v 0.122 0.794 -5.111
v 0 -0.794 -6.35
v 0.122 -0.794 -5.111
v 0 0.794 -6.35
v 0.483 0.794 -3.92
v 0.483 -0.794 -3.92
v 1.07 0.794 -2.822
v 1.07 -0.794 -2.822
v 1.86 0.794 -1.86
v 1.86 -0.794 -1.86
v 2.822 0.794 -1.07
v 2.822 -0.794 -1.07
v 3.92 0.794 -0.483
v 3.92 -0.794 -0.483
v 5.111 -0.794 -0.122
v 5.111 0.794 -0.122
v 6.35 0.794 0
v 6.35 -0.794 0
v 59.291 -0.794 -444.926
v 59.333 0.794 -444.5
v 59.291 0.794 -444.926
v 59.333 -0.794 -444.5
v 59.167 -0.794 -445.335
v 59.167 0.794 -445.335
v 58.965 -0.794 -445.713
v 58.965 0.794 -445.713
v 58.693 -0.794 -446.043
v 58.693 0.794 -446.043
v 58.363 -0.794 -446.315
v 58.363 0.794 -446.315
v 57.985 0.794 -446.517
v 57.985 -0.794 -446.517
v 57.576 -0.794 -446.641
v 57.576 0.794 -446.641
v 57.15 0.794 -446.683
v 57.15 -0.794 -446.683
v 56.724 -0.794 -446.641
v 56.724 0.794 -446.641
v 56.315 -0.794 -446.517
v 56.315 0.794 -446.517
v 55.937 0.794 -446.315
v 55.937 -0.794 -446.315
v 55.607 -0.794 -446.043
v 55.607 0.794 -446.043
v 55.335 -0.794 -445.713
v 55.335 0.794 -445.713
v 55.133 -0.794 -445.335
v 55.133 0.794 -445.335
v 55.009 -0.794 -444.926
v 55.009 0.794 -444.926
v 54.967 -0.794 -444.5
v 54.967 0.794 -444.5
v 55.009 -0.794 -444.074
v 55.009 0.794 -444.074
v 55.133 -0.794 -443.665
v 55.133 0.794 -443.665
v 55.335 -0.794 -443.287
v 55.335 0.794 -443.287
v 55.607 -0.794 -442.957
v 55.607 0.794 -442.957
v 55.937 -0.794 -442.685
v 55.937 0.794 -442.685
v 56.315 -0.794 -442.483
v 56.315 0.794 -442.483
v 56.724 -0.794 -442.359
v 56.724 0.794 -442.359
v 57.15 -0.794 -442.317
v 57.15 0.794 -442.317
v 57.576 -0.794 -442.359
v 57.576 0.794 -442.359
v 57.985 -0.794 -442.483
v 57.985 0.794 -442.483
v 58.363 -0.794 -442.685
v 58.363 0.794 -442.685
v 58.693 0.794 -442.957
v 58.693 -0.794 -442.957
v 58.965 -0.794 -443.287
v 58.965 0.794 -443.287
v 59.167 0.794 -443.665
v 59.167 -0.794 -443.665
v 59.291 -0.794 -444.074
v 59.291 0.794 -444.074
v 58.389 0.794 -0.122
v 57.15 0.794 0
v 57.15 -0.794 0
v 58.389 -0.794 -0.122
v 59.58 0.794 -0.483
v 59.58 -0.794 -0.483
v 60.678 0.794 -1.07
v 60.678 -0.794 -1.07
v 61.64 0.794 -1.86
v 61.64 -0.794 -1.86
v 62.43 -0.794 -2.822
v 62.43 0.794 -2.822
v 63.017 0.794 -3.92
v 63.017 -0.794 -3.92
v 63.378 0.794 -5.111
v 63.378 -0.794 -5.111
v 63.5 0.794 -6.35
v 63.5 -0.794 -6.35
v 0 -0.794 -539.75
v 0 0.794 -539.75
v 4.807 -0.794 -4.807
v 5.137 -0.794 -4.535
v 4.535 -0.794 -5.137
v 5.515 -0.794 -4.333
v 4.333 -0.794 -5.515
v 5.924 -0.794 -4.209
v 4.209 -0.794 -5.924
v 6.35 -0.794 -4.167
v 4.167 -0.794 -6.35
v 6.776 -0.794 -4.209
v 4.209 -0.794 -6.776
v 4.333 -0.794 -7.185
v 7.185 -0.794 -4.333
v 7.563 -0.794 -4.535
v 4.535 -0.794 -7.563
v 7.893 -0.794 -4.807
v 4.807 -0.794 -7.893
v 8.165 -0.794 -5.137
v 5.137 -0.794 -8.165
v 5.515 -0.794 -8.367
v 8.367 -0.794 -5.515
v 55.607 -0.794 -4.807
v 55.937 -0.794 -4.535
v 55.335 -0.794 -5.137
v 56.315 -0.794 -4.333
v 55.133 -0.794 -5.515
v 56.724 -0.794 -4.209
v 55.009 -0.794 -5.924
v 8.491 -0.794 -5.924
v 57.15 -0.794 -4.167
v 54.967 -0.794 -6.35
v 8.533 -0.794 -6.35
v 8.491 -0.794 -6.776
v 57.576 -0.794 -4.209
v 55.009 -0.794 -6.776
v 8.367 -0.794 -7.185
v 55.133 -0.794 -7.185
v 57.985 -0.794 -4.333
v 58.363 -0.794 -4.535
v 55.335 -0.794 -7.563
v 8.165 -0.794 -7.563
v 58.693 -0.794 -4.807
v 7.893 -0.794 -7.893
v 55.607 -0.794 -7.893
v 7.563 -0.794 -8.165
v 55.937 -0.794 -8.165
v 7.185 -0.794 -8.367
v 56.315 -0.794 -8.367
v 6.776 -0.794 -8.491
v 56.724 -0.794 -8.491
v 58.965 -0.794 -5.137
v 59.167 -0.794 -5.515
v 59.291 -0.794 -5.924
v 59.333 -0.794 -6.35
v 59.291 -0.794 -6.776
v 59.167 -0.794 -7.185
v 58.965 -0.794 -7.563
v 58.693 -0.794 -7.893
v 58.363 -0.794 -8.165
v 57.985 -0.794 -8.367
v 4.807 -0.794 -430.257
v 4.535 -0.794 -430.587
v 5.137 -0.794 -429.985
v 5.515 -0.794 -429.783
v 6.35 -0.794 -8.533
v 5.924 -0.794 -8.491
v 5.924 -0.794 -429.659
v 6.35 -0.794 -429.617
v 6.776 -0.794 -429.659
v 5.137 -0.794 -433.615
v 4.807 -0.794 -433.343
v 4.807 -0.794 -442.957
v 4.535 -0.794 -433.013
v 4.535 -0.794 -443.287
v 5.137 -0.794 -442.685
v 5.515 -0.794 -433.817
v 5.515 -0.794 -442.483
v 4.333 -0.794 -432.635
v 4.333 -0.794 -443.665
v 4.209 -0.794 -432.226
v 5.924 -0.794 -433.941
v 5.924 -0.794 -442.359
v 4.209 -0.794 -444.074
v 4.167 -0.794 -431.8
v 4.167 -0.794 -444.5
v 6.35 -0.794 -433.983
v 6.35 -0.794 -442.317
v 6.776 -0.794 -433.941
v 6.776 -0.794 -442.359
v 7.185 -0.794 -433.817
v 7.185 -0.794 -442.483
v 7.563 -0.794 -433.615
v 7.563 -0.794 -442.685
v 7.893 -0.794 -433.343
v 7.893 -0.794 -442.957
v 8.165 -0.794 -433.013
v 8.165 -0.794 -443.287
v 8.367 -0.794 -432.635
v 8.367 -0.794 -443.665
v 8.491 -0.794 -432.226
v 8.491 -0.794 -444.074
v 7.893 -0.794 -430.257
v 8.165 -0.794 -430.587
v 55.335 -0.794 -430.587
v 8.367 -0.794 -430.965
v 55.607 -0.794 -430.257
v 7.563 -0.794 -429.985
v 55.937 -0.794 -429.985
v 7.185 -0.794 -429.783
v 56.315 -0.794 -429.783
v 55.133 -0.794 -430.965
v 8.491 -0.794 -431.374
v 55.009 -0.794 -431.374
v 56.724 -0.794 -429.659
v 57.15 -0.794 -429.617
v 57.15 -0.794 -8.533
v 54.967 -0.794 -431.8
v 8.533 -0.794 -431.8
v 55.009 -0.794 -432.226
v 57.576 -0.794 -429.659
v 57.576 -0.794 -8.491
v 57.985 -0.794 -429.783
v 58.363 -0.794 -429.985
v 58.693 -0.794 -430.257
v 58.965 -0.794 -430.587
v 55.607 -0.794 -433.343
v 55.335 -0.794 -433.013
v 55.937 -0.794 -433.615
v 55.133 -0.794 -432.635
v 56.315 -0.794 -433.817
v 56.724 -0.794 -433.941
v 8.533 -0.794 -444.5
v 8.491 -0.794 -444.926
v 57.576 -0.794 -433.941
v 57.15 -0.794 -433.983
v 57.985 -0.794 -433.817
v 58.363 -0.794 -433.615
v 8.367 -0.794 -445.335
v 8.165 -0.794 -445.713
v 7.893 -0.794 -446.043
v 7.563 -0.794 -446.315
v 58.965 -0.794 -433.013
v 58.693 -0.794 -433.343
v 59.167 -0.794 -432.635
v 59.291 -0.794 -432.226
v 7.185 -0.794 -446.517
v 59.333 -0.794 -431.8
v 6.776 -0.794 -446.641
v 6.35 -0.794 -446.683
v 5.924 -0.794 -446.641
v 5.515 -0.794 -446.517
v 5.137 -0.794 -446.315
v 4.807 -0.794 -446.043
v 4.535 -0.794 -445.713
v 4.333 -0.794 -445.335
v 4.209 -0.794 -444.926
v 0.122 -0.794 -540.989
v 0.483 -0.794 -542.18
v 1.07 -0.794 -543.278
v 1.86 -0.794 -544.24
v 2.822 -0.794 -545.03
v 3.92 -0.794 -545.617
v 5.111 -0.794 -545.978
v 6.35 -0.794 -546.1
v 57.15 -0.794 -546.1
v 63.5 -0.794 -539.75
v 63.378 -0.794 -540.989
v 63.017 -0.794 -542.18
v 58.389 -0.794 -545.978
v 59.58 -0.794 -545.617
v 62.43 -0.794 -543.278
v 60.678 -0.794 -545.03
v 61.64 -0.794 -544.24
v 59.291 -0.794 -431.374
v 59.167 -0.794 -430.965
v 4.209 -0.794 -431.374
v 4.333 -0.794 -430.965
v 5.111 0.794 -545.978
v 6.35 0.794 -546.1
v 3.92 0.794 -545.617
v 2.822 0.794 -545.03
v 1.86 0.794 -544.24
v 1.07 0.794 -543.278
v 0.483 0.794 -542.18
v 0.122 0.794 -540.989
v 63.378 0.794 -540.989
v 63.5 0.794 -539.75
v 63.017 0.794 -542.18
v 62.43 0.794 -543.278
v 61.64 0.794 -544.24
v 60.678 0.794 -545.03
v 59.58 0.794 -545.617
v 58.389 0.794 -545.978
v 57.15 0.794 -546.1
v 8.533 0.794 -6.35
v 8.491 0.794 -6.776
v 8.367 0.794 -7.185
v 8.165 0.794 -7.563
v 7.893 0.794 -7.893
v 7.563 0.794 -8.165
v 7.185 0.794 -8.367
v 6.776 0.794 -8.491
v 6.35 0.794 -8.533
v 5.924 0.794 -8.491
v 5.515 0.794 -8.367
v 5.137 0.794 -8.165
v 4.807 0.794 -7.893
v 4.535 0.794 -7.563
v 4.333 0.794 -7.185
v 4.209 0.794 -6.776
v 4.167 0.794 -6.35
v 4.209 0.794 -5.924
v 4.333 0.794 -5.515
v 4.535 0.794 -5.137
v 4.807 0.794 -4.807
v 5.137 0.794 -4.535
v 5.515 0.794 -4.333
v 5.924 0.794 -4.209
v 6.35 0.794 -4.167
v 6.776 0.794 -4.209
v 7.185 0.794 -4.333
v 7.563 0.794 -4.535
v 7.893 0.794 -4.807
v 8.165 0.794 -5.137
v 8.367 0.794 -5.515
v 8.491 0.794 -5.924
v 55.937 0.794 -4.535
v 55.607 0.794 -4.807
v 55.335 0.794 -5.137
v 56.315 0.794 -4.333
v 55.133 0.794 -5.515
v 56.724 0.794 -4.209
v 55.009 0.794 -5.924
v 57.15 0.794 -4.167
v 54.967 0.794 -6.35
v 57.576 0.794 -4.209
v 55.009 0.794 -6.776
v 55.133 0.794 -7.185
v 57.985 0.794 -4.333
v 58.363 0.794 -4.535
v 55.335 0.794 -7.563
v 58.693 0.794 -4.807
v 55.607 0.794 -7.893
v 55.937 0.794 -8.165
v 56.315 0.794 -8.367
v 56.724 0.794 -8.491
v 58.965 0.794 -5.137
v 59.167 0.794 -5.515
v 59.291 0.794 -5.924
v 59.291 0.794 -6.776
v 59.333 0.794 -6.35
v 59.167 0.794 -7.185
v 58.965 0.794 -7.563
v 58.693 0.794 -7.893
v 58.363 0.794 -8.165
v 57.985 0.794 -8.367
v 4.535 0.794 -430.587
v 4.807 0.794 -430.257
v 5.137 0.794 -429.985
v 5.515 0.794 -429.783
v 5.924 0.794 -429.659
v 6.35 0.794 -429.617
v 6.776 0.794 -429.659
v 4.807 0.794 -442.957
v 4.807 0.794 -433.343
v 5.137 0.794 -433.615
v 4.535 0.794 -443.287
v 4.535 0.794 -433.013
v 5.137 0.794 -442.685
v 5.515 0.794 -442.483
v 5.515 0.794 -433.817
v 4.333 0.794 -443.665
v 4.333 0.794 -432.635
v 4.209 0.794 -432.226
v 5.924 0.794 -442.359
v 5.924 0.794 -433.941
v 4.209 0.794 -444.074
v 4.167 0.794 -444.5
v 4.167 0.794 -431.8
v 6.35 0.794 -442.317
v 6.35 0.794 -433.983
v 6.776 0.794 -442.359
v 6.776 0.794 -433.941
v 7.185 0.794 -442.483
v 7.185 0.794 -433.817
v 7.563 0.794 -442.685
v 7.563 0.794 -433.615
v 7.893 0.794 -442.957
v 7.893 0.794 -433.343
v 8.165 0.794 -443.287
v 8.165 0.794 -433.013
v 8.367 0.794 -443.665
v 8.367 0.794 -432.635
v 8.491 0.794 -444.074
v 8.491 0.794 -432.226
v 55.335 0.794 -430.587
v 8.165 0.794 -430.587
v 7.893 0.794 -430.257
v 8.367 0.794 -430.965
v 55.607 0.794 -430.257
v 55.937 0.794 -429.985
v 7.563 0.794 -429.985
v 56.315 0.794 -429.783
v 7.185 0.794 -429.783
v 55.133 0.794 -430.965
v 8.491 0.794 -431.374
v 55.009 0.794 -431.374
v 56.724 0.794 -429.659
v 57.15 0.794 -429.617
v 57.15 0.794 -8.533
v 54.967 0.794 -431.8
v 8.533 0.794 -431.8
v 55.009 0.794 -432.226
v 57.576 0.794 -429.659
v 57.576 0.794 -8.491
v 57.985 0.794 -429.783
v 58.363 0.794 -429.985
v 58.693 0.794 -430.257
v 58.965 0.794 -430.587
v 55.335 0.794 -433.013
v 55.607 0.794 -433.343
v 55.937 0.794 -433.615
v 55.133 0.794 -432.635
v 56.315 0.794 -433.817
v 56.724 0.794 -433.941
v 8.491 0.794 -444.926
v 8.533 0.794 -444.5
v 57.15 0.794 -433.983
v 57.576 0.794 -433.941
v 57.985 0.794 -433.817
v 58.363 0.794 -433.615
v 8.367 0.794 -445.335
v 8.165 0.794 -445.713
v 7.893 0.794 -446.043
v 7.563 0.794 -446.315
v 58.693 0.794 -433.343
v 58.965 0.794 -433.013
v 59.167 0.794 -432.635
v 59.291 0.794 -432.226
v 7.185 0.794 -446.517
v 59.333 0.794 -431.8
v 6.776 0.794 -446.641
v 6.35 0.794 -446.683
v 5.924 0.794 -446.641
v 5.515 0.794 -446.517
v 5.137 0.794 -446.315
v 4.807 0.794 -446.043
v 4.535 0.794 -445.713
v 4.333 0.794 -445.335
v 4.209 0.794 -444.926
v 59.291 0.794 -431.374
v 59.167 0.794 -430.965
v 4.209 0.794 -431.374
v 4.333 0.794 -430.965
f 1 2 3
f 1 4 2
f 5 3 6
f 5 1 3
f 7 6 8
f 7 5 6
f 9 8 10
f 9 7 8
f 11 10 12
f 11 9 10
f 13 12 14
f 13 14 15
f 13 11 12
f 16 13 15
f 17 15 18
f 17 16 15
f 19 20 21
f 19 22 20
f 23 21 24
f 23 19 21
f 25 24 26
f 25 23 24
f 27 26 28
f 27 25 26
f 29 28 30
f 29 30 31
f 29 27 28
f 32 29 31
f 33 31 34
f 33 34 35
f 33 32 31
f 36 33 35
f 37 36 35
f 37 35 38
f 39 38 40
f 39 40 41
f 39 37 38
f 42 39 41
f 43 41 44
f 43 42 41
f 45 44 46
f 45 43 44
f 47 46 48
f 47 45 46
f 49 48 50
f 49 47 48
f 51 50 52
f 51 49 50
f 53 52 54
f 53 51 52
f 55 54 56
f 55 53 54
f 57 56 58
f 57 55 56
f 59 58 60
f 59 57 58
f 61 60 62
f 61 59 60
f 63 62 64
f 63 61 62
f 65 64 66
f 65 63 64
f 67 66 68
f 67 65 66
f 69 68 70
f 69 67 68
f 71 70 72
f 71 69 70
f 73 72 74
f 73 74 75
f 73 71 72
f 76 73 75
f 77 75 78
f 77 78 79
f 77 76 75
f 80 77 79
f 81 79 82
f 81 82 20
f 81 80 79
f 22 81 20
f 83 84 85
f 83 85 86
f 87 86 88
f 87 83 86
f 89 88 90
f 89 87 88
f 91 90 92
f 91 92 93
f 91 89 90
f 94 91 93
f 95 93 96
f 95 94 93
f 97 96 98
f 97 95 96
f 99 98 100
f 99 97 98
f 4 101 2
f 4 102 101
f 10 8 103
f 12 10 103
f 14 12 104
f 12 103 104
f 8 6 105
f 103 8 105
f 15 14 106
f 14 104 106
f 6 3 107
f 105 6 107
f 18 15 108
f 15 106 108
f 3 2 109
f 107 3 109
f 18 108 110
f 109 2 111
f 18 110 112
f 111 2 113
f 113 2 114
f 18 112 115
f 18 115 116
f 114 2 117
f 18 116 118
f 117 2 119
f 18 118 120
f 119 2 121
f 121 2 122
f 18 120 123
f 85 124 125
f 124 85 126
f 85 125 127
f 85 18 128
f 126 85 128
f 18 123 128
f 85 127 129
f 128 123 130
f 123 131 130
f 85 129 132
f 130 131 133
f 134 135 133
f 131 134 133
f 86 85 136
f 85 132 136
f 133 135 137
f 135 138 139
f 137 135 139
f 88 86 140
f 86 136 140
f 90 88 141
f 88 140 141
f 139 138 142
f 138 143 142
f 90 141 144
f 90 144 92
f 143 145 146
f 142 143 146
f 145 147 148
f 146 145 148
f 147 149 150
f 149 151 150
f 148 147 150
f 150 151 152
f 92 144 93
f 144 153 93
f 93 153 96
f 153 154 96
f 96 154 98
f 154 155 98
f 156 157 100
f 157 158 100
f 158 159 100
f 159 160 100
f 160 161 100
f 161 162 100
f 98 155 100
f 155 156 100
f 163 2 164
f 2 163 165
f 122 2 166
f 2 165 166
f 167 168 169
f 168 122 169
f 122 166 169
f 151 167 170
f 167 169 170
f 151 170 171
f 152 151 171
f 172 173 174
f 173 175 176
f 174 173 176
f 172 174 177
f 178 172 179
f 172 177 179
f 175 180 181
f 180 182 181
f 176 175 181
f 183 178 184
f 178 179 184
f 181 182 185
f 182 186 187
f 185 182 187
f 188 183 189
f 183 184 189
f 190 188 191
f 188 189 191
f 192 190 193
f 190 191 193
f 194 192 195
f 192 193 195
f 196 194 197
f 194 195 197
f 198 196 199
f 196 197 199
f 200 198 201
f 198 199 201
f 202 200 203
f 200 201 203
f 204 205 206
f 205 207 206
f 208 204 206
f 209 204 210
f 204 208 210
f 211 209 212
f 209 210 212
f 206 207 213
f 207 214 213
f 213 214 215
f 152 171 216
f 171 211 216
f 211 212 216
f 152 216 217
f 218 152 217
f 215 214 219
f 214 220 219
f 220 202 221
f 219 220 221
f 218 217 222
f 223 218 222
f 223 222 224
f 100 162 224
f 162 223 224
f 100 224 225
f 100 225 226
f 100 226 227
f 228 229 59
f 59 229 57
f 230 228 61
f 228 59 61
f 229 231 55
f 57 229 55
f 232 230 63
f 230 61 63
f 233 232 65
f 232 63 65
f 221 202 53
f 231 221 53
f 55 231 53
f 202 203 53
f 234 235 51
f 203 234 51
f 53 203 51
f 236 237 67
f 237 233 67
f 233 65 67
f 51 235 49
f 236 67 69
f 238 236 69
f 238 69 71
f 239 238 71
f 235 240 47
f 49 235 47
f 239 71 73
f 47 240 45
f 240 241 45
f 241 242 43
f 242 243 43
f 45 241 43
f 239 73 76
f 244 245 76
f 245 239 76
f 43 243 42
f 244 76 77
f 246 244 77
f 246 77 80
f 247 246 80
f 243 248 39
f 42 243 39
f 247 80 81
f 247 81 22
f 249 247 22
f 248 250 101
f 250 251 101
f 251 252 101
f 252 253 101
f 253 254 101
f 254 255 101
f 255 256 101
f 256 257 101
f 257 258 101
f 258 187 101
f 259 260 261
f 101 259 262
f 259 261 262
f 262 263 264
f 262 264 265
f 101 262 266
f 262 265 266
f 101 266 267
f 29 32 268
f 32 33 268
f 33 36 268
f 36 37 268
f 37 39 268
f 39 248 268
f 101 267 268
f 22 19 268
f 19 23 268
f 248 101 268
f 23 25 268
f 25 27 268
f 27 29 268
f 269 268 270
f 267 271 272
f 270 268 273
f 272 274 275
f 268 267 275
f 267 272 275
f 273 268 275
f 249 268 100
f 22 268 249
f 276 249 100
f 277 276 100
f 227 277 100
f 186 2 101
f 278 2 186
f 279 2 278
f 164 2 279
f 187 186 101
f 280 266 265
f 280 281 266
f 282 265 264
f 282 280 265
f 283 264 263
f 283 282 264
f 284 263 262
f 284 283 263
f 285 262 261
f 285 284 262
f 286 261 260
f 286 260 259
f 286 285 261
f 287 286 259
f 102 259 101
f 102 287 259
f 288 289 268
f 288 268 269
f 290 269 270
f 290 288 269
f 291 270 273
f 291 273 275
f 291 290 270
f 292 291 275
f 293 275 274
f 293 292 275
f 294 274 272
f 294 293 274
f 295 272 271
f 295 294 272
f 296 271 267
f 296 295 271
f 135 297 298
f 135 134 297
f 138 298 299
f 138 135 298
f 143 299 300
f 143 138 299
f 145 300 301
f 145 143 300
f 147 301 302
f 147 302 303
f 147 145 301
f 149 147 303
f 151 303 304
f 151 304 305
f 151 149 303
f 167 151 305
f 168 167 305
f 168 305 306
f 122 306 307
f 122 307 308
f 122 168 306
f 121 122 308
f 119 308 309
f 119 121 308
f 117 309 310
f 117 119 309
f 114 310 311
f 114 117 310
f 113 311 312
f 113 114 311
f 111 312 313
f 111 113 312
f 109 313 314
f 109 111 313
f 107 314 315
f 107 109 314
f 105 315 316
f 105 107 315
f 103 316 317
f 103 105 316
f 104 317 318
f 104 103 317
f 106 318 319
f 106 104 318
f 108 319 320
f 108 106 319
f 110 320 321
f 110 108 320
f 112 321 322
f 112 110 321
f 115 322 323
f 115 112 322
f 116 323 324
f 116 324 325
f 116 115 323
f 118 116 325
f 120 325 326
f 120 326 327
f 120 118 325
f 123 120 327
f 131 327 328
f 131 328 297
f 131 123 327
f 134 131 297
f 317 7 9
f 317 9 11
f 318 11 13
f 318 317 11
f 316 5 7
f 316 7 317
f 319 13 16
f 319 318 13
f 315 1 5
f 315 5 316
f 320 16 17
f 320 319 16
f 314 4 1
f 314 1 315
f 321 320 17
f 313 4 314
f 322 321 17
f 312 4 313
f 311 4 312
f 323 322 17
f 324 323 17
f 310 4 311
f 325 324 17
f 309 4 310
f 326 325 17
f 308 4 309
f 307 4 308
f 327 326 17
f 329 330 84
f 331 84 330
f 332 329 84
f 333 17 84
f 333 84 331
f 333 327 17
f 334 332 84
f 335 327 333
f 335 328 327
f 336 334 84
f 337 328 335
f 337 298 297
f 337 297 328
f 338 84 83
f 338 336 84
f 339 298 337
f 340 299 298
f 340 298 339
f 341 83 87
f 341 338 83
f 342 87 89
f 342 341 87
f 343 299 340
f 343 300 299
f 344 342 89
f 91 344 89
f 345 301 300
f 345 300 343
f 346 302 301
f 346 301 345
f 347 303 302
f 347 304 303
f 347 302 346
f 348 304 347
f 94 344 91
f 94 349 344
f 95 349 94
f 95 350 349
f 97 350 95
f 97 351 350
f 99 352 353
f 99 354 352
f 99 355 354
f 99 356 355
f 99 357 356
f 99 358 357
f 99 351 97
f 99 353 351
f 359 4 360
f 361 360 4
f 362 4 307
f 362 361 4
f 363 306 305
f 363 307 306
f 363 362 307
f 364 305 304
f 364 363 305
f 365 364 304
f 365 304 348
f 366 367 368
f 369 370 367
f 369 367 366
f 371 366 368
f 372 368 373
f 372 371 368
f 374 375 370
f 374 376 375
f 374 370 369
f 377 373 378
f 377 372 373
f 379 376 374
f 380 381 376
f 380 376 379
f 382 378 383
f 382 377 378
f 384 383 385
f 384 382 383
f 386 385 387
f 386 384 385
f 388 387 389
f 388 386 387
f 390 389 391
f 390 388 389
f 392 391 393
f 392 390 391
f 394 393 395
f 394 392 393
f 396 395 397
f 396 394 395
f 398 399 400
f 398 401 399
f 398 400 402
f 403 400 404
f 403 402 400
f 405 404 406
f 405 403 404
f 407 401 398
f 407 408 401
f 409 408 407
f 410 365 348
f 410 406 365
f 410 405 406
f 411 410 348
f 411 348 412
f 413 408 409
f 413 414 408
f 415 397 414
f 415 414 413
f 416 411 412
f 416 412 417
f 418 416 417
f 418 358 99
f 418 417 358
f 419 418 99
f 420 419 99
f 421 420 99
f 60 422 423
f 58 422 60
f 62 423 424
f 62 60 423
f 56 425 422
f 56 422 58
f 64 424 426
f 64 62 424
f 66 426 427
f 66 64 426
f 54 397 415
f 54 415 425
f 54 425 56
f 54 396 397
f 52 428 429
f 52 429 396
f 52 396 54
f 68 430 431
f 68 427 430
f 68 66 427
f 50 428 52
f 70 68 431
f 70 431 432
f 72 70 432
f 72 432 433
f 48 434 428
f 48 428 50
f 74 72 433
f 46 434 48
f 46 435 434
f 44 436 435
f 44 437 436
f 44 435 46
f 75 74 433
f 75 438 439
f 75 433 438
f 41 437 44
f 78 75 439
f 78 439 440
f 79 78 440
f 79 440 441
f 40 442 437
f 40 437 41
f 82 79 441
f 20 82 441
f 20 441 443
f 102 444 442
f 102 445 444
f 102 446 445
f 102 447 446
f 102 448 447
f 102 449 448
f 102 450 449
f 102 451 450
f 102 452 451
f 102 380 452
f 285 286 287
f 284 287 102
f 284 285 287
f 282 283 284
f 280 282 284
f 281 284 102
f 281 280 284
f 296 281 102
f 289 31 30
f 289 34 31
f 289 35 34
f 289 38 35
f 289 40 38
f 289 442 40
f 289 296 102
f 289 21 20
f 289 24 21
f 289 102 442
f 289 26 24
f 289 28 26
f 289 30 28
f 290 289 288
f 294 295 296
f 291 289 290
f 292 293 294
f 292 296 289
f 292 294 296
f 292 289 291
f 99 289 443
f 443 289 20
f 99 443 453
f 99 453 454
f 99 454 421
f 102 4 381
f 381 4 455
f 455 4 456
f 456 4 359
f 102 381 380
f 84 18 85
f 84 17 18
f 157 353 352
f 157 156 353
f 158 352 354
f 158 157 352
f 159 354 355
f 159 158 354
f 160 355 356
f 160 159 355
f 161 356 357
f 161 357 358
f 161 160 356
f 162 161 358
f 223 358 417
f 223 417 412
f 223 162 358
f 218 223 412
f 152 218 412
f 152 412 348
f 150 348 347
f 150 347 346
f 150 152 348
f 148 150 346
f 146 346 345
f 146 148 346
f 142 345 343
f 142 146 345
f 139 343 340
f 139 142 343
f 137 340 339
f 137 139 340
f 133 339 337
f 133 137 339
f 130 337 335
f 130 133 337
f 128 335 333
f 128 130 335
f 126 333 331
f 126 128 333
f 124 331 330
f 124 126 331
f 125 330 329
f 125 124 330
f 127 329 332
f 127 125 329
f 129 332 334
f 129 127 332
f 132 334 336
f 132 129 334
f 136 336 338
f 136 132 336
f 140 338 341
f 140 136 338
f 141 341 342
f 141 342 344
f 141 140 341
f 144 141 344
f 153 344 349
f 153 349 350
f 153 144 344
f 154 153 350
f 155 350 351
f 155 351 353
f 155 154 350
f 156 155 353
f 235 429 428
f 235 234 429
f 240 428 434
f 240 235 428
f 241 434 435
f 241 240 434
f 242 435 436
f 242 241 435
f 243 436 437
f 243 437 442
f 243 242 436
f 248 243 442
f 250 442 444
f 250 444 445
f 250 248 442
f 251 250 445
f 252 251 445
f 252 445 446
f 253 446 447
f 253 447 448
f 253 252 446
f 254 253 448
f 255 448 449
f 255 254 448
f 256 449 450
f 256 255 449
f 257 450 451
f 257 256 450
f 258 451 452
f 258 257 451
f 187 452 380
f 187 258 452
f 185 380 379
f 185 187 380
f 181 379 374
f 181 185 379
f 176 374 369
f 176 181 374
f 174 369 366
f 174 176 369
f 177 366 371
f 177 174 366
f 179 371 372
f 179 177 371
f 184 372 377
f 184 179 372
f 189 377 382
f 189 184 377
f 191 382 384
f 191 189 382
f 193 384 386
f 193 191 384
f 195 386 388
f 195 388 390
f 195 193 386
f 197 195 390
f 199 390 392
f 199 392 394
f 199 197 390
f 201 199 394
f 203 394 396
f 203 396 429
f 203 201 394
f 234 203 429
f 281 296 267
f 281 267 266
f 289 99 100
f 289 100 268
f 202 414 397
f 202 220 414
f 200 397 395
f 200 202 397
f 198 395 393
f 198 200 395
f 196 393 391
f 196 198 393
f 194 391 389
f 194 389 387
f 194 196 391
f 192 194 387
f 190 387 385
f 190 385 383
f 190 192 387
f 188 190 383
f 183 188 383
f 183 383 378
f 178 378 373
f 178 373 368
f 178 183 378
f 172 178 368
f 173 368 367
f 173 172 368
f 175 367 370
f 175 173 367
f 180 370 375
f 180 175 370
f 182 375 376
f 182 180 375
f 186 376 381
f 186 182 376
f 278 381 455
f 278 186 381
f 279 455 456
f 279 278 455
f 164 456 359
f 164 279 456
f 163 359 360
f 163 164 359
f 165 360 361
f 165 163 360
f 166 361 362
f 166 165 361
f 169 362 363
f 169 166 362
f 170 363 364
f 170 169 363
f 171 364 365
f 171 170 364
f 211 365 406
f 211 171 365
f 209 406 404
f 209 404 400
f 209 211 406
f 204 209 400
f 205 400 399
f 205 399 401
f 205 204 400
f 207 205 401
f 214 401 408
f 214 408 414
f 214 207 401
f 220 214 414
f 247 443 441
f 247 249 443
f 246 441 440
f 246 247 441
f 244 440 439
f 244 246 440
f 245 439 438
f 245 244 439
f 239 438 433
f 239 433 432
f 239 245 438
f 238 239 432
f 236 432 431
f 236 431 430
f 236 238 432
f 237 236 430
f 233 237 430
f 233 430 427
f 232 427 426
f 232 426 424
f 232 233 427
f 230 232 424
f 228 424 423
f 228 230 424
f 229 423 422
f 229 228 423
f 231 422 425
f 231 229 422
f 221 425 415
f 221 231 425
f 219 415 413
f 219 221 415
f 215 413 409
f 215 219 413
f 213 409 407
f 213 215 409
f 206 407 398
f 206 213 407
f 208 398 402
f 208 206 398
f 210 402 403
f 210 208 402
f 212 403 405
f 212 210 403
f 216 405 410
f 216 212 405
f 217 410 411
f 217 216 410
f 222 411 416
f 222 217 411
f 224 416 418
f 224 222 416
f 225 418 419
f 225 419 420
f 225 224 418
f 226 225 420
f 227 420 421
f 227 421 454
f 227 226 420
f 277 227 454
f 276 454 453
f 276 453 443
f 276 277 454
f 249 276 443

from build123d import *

# Parameters (mm, degrees)
SKETCH1_R           = 2.1828125
BOSS_EXTRUDE1_DEPTH = 0.79375


with BuildPart() as part:
    # Sketch1 → Boss-Extrude1 (new body, symmetric)
    with BuildSketch(Plane(origin=(0, 0, 0), x_dir=(1, 0, 0), z_dir=(0, 1, 0))):
        with BuildLine():
            Line((6.35, 0), (57.15, 0))
            ThreePointArc((57.15, 0), (61.640128061, 1.859871939), (63.5, 6.35))
            Line((63.5, 6.35), (63.5, 539.75))
            ThreePointArc((63.5, 539.75), (61.640128061, 544.240128061), (57.15, 546.1))
            Line((57.15, 546.1), (6.35, 546.1))
            ThreePointArc((6.35, 546.1), (1.859871939, 544.240128061), (0, 539.75))
            Line((0, 539.75), (0, 6.35))
            ThreePointArc((0, 6.35), (1.859871939, 1.859871939), (6.35, 0))
        make_face()
        with Locations((6.35, 6.35)):
            Circle(SKETCH1_R, mode=Mode.SUBTRACT)
        with Locations((57.15, 6.35)):
            Circle(SKETCH1_R, mode=Mode.SUBTRACT)
        with Locations((6.35, 431.8)):
            Circle(SKETCH1_R, mode=Mode.SUBTRACT)
        with Locations((6.35, 444.5)):
            Circle(SKETCH1_R, mode=Mode.SUBTRACT)
        with Locations((57.15, 431.8)):
            Circle(SKETCH1_R, mode=Mode.SUBTRACT)
        with Locations((57.15, 444.5)):
            Circle(SKETCH1_R, mode=Mode.SUBTRACT)
    extrude(amount=BOSS_EXTRUDE1_DEPTH, both=True)


solid = part.part
